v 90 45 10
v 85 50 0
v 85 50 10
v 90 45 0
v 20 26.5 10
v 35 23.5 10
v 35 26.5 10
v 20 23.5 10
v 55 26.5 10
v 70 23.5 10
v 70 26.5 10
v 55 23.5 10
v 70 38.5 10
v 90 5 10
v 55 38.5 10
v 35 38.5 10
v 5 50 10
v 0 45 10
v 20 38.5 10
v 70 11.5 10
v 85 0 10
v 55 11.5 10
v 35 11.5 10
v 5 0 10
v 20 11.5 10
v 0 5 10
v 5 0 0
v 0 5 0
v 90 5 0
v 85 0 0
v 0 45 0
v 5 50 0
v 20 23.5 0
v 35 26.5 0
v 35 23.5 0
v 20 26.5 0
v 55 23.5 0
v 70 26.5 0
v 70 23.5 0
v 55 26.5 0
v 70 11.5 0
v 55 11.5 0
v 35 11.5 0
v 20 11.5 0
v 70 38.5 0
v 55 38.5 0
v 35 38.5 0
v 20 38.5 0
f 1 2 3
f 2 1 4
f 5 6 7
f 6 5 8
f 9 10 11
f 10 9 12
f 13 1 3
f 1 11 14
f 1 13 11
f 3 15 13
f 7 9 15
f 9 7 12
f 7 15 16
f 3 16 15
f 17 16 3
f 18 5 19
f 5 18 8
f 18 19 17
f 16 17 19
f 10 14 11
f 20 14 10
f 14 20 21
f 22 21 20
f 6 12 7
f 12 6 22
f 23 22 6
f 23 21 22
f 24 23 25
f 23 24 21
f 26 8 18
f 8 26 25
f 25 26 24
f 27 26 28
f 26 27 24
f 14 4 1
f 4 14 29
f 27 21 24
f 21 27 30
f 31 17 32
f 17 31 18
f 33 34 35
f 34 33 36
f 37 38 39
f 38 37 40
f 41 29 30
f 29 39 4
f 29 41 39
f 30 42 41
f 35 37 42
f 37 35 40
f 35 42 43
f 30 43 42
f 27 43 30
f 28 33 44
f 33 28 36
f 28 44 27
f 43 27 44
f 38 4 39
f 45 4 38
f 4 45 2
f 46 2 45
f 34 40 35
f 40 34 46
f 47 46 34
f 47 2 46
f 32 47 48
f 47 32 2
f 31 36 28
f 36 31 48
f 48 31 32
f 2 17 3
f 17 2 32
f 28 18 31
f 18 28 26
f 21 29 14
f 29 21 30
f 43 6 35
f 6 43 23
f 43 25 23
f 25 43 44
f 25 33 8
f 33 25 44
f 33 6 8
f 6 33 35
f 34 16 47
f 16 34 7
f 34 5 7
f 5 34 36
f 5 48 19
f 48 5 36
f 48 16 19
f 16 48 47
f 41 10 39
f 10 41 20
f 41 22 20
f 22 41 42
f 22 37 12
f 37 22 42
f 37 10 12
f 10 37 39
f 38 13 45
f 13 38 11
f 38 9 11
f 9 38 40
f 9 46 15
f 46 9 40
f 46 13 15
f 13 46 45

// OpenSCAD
$fn = 32;

// ----------------------------------------------------------------------
// Windowed plate: 4 voids, 90 x 50 x 10 mm
// ----------------------------------------------------------------------

// --- parameters (mm) ---
plate_l = 90;             // plate length, X
plate_w = 50;             // plate width, Y
plate_t = 10;             // plate thickness, Z
edge_margin = 10;         // wall from the plate edge to any window
win_l = 15;               // pocket length
win_w = 12;               // pocket width
pitch_x = 35;             // grid pitch along X
pitch_y = 15;             // grid pitch along Y
depth_1 = 10;             // depth of void 1 (full thickness = through)
depth_2 = 10;             // depth of void 2 (full thickness = through)
depth_3 = 10;             // depth of void 3 (full thickness = through)
depth_4 = 10;             // depth of void 4 (full thickness = through)
corner_c = 5;             // corner chamfer of the plate
fit_tol = 0.05;           // declared fit tolerance (prompt contract)
free_tol = 0.2;           // declared free tolerance (prompt contract)

profile = [[5, 0], [85, 0], [90, 5], [90, 45], [85, 50], [5, 50], [0, 45], [0, 5]];  // primary outline, 8 points, counter clockwise
void_1 = [[20, 11.5], [35, 11.5], [35, 23.5], [20, 23.5]];  // pocket at grid node 0,0, 4 points
void_2 = [[20, 26.5], [35, 26.5], [35, 38.5], [20, 38.5]];  // pocket at grid node 0,1, 4 points
void_3 = [[55, 11.5], [70, 11.5], [70, 23.5], [55, 23.5]];  // pocket at grid node 1,0, 4 points
void_4 = [[55, 26.5], [70, 26.5], [70, 38.5], [55, 38.5]];  // pocket at grid node 1,1, 4 points

// --- the one profile operation ---
difference() {
  linear_extrude(height = plate_t) polygon(points = profile);
  translate([0, 0, -1])
    linear_extrude(height = plate_t + 2) polygon(points = void_1);
  translate([0, 0, -1])
    linear_extrude(height = plate_t + 2) polygon(points = void_2);
  translate([0, 0, -1])
    linear_extrude(height = plate_t + 2) polygon(points = void_3);
  translate([0, 0, -1])
    linear_extrude(height = plate_t + 2) polygon(points = void_4);
}
